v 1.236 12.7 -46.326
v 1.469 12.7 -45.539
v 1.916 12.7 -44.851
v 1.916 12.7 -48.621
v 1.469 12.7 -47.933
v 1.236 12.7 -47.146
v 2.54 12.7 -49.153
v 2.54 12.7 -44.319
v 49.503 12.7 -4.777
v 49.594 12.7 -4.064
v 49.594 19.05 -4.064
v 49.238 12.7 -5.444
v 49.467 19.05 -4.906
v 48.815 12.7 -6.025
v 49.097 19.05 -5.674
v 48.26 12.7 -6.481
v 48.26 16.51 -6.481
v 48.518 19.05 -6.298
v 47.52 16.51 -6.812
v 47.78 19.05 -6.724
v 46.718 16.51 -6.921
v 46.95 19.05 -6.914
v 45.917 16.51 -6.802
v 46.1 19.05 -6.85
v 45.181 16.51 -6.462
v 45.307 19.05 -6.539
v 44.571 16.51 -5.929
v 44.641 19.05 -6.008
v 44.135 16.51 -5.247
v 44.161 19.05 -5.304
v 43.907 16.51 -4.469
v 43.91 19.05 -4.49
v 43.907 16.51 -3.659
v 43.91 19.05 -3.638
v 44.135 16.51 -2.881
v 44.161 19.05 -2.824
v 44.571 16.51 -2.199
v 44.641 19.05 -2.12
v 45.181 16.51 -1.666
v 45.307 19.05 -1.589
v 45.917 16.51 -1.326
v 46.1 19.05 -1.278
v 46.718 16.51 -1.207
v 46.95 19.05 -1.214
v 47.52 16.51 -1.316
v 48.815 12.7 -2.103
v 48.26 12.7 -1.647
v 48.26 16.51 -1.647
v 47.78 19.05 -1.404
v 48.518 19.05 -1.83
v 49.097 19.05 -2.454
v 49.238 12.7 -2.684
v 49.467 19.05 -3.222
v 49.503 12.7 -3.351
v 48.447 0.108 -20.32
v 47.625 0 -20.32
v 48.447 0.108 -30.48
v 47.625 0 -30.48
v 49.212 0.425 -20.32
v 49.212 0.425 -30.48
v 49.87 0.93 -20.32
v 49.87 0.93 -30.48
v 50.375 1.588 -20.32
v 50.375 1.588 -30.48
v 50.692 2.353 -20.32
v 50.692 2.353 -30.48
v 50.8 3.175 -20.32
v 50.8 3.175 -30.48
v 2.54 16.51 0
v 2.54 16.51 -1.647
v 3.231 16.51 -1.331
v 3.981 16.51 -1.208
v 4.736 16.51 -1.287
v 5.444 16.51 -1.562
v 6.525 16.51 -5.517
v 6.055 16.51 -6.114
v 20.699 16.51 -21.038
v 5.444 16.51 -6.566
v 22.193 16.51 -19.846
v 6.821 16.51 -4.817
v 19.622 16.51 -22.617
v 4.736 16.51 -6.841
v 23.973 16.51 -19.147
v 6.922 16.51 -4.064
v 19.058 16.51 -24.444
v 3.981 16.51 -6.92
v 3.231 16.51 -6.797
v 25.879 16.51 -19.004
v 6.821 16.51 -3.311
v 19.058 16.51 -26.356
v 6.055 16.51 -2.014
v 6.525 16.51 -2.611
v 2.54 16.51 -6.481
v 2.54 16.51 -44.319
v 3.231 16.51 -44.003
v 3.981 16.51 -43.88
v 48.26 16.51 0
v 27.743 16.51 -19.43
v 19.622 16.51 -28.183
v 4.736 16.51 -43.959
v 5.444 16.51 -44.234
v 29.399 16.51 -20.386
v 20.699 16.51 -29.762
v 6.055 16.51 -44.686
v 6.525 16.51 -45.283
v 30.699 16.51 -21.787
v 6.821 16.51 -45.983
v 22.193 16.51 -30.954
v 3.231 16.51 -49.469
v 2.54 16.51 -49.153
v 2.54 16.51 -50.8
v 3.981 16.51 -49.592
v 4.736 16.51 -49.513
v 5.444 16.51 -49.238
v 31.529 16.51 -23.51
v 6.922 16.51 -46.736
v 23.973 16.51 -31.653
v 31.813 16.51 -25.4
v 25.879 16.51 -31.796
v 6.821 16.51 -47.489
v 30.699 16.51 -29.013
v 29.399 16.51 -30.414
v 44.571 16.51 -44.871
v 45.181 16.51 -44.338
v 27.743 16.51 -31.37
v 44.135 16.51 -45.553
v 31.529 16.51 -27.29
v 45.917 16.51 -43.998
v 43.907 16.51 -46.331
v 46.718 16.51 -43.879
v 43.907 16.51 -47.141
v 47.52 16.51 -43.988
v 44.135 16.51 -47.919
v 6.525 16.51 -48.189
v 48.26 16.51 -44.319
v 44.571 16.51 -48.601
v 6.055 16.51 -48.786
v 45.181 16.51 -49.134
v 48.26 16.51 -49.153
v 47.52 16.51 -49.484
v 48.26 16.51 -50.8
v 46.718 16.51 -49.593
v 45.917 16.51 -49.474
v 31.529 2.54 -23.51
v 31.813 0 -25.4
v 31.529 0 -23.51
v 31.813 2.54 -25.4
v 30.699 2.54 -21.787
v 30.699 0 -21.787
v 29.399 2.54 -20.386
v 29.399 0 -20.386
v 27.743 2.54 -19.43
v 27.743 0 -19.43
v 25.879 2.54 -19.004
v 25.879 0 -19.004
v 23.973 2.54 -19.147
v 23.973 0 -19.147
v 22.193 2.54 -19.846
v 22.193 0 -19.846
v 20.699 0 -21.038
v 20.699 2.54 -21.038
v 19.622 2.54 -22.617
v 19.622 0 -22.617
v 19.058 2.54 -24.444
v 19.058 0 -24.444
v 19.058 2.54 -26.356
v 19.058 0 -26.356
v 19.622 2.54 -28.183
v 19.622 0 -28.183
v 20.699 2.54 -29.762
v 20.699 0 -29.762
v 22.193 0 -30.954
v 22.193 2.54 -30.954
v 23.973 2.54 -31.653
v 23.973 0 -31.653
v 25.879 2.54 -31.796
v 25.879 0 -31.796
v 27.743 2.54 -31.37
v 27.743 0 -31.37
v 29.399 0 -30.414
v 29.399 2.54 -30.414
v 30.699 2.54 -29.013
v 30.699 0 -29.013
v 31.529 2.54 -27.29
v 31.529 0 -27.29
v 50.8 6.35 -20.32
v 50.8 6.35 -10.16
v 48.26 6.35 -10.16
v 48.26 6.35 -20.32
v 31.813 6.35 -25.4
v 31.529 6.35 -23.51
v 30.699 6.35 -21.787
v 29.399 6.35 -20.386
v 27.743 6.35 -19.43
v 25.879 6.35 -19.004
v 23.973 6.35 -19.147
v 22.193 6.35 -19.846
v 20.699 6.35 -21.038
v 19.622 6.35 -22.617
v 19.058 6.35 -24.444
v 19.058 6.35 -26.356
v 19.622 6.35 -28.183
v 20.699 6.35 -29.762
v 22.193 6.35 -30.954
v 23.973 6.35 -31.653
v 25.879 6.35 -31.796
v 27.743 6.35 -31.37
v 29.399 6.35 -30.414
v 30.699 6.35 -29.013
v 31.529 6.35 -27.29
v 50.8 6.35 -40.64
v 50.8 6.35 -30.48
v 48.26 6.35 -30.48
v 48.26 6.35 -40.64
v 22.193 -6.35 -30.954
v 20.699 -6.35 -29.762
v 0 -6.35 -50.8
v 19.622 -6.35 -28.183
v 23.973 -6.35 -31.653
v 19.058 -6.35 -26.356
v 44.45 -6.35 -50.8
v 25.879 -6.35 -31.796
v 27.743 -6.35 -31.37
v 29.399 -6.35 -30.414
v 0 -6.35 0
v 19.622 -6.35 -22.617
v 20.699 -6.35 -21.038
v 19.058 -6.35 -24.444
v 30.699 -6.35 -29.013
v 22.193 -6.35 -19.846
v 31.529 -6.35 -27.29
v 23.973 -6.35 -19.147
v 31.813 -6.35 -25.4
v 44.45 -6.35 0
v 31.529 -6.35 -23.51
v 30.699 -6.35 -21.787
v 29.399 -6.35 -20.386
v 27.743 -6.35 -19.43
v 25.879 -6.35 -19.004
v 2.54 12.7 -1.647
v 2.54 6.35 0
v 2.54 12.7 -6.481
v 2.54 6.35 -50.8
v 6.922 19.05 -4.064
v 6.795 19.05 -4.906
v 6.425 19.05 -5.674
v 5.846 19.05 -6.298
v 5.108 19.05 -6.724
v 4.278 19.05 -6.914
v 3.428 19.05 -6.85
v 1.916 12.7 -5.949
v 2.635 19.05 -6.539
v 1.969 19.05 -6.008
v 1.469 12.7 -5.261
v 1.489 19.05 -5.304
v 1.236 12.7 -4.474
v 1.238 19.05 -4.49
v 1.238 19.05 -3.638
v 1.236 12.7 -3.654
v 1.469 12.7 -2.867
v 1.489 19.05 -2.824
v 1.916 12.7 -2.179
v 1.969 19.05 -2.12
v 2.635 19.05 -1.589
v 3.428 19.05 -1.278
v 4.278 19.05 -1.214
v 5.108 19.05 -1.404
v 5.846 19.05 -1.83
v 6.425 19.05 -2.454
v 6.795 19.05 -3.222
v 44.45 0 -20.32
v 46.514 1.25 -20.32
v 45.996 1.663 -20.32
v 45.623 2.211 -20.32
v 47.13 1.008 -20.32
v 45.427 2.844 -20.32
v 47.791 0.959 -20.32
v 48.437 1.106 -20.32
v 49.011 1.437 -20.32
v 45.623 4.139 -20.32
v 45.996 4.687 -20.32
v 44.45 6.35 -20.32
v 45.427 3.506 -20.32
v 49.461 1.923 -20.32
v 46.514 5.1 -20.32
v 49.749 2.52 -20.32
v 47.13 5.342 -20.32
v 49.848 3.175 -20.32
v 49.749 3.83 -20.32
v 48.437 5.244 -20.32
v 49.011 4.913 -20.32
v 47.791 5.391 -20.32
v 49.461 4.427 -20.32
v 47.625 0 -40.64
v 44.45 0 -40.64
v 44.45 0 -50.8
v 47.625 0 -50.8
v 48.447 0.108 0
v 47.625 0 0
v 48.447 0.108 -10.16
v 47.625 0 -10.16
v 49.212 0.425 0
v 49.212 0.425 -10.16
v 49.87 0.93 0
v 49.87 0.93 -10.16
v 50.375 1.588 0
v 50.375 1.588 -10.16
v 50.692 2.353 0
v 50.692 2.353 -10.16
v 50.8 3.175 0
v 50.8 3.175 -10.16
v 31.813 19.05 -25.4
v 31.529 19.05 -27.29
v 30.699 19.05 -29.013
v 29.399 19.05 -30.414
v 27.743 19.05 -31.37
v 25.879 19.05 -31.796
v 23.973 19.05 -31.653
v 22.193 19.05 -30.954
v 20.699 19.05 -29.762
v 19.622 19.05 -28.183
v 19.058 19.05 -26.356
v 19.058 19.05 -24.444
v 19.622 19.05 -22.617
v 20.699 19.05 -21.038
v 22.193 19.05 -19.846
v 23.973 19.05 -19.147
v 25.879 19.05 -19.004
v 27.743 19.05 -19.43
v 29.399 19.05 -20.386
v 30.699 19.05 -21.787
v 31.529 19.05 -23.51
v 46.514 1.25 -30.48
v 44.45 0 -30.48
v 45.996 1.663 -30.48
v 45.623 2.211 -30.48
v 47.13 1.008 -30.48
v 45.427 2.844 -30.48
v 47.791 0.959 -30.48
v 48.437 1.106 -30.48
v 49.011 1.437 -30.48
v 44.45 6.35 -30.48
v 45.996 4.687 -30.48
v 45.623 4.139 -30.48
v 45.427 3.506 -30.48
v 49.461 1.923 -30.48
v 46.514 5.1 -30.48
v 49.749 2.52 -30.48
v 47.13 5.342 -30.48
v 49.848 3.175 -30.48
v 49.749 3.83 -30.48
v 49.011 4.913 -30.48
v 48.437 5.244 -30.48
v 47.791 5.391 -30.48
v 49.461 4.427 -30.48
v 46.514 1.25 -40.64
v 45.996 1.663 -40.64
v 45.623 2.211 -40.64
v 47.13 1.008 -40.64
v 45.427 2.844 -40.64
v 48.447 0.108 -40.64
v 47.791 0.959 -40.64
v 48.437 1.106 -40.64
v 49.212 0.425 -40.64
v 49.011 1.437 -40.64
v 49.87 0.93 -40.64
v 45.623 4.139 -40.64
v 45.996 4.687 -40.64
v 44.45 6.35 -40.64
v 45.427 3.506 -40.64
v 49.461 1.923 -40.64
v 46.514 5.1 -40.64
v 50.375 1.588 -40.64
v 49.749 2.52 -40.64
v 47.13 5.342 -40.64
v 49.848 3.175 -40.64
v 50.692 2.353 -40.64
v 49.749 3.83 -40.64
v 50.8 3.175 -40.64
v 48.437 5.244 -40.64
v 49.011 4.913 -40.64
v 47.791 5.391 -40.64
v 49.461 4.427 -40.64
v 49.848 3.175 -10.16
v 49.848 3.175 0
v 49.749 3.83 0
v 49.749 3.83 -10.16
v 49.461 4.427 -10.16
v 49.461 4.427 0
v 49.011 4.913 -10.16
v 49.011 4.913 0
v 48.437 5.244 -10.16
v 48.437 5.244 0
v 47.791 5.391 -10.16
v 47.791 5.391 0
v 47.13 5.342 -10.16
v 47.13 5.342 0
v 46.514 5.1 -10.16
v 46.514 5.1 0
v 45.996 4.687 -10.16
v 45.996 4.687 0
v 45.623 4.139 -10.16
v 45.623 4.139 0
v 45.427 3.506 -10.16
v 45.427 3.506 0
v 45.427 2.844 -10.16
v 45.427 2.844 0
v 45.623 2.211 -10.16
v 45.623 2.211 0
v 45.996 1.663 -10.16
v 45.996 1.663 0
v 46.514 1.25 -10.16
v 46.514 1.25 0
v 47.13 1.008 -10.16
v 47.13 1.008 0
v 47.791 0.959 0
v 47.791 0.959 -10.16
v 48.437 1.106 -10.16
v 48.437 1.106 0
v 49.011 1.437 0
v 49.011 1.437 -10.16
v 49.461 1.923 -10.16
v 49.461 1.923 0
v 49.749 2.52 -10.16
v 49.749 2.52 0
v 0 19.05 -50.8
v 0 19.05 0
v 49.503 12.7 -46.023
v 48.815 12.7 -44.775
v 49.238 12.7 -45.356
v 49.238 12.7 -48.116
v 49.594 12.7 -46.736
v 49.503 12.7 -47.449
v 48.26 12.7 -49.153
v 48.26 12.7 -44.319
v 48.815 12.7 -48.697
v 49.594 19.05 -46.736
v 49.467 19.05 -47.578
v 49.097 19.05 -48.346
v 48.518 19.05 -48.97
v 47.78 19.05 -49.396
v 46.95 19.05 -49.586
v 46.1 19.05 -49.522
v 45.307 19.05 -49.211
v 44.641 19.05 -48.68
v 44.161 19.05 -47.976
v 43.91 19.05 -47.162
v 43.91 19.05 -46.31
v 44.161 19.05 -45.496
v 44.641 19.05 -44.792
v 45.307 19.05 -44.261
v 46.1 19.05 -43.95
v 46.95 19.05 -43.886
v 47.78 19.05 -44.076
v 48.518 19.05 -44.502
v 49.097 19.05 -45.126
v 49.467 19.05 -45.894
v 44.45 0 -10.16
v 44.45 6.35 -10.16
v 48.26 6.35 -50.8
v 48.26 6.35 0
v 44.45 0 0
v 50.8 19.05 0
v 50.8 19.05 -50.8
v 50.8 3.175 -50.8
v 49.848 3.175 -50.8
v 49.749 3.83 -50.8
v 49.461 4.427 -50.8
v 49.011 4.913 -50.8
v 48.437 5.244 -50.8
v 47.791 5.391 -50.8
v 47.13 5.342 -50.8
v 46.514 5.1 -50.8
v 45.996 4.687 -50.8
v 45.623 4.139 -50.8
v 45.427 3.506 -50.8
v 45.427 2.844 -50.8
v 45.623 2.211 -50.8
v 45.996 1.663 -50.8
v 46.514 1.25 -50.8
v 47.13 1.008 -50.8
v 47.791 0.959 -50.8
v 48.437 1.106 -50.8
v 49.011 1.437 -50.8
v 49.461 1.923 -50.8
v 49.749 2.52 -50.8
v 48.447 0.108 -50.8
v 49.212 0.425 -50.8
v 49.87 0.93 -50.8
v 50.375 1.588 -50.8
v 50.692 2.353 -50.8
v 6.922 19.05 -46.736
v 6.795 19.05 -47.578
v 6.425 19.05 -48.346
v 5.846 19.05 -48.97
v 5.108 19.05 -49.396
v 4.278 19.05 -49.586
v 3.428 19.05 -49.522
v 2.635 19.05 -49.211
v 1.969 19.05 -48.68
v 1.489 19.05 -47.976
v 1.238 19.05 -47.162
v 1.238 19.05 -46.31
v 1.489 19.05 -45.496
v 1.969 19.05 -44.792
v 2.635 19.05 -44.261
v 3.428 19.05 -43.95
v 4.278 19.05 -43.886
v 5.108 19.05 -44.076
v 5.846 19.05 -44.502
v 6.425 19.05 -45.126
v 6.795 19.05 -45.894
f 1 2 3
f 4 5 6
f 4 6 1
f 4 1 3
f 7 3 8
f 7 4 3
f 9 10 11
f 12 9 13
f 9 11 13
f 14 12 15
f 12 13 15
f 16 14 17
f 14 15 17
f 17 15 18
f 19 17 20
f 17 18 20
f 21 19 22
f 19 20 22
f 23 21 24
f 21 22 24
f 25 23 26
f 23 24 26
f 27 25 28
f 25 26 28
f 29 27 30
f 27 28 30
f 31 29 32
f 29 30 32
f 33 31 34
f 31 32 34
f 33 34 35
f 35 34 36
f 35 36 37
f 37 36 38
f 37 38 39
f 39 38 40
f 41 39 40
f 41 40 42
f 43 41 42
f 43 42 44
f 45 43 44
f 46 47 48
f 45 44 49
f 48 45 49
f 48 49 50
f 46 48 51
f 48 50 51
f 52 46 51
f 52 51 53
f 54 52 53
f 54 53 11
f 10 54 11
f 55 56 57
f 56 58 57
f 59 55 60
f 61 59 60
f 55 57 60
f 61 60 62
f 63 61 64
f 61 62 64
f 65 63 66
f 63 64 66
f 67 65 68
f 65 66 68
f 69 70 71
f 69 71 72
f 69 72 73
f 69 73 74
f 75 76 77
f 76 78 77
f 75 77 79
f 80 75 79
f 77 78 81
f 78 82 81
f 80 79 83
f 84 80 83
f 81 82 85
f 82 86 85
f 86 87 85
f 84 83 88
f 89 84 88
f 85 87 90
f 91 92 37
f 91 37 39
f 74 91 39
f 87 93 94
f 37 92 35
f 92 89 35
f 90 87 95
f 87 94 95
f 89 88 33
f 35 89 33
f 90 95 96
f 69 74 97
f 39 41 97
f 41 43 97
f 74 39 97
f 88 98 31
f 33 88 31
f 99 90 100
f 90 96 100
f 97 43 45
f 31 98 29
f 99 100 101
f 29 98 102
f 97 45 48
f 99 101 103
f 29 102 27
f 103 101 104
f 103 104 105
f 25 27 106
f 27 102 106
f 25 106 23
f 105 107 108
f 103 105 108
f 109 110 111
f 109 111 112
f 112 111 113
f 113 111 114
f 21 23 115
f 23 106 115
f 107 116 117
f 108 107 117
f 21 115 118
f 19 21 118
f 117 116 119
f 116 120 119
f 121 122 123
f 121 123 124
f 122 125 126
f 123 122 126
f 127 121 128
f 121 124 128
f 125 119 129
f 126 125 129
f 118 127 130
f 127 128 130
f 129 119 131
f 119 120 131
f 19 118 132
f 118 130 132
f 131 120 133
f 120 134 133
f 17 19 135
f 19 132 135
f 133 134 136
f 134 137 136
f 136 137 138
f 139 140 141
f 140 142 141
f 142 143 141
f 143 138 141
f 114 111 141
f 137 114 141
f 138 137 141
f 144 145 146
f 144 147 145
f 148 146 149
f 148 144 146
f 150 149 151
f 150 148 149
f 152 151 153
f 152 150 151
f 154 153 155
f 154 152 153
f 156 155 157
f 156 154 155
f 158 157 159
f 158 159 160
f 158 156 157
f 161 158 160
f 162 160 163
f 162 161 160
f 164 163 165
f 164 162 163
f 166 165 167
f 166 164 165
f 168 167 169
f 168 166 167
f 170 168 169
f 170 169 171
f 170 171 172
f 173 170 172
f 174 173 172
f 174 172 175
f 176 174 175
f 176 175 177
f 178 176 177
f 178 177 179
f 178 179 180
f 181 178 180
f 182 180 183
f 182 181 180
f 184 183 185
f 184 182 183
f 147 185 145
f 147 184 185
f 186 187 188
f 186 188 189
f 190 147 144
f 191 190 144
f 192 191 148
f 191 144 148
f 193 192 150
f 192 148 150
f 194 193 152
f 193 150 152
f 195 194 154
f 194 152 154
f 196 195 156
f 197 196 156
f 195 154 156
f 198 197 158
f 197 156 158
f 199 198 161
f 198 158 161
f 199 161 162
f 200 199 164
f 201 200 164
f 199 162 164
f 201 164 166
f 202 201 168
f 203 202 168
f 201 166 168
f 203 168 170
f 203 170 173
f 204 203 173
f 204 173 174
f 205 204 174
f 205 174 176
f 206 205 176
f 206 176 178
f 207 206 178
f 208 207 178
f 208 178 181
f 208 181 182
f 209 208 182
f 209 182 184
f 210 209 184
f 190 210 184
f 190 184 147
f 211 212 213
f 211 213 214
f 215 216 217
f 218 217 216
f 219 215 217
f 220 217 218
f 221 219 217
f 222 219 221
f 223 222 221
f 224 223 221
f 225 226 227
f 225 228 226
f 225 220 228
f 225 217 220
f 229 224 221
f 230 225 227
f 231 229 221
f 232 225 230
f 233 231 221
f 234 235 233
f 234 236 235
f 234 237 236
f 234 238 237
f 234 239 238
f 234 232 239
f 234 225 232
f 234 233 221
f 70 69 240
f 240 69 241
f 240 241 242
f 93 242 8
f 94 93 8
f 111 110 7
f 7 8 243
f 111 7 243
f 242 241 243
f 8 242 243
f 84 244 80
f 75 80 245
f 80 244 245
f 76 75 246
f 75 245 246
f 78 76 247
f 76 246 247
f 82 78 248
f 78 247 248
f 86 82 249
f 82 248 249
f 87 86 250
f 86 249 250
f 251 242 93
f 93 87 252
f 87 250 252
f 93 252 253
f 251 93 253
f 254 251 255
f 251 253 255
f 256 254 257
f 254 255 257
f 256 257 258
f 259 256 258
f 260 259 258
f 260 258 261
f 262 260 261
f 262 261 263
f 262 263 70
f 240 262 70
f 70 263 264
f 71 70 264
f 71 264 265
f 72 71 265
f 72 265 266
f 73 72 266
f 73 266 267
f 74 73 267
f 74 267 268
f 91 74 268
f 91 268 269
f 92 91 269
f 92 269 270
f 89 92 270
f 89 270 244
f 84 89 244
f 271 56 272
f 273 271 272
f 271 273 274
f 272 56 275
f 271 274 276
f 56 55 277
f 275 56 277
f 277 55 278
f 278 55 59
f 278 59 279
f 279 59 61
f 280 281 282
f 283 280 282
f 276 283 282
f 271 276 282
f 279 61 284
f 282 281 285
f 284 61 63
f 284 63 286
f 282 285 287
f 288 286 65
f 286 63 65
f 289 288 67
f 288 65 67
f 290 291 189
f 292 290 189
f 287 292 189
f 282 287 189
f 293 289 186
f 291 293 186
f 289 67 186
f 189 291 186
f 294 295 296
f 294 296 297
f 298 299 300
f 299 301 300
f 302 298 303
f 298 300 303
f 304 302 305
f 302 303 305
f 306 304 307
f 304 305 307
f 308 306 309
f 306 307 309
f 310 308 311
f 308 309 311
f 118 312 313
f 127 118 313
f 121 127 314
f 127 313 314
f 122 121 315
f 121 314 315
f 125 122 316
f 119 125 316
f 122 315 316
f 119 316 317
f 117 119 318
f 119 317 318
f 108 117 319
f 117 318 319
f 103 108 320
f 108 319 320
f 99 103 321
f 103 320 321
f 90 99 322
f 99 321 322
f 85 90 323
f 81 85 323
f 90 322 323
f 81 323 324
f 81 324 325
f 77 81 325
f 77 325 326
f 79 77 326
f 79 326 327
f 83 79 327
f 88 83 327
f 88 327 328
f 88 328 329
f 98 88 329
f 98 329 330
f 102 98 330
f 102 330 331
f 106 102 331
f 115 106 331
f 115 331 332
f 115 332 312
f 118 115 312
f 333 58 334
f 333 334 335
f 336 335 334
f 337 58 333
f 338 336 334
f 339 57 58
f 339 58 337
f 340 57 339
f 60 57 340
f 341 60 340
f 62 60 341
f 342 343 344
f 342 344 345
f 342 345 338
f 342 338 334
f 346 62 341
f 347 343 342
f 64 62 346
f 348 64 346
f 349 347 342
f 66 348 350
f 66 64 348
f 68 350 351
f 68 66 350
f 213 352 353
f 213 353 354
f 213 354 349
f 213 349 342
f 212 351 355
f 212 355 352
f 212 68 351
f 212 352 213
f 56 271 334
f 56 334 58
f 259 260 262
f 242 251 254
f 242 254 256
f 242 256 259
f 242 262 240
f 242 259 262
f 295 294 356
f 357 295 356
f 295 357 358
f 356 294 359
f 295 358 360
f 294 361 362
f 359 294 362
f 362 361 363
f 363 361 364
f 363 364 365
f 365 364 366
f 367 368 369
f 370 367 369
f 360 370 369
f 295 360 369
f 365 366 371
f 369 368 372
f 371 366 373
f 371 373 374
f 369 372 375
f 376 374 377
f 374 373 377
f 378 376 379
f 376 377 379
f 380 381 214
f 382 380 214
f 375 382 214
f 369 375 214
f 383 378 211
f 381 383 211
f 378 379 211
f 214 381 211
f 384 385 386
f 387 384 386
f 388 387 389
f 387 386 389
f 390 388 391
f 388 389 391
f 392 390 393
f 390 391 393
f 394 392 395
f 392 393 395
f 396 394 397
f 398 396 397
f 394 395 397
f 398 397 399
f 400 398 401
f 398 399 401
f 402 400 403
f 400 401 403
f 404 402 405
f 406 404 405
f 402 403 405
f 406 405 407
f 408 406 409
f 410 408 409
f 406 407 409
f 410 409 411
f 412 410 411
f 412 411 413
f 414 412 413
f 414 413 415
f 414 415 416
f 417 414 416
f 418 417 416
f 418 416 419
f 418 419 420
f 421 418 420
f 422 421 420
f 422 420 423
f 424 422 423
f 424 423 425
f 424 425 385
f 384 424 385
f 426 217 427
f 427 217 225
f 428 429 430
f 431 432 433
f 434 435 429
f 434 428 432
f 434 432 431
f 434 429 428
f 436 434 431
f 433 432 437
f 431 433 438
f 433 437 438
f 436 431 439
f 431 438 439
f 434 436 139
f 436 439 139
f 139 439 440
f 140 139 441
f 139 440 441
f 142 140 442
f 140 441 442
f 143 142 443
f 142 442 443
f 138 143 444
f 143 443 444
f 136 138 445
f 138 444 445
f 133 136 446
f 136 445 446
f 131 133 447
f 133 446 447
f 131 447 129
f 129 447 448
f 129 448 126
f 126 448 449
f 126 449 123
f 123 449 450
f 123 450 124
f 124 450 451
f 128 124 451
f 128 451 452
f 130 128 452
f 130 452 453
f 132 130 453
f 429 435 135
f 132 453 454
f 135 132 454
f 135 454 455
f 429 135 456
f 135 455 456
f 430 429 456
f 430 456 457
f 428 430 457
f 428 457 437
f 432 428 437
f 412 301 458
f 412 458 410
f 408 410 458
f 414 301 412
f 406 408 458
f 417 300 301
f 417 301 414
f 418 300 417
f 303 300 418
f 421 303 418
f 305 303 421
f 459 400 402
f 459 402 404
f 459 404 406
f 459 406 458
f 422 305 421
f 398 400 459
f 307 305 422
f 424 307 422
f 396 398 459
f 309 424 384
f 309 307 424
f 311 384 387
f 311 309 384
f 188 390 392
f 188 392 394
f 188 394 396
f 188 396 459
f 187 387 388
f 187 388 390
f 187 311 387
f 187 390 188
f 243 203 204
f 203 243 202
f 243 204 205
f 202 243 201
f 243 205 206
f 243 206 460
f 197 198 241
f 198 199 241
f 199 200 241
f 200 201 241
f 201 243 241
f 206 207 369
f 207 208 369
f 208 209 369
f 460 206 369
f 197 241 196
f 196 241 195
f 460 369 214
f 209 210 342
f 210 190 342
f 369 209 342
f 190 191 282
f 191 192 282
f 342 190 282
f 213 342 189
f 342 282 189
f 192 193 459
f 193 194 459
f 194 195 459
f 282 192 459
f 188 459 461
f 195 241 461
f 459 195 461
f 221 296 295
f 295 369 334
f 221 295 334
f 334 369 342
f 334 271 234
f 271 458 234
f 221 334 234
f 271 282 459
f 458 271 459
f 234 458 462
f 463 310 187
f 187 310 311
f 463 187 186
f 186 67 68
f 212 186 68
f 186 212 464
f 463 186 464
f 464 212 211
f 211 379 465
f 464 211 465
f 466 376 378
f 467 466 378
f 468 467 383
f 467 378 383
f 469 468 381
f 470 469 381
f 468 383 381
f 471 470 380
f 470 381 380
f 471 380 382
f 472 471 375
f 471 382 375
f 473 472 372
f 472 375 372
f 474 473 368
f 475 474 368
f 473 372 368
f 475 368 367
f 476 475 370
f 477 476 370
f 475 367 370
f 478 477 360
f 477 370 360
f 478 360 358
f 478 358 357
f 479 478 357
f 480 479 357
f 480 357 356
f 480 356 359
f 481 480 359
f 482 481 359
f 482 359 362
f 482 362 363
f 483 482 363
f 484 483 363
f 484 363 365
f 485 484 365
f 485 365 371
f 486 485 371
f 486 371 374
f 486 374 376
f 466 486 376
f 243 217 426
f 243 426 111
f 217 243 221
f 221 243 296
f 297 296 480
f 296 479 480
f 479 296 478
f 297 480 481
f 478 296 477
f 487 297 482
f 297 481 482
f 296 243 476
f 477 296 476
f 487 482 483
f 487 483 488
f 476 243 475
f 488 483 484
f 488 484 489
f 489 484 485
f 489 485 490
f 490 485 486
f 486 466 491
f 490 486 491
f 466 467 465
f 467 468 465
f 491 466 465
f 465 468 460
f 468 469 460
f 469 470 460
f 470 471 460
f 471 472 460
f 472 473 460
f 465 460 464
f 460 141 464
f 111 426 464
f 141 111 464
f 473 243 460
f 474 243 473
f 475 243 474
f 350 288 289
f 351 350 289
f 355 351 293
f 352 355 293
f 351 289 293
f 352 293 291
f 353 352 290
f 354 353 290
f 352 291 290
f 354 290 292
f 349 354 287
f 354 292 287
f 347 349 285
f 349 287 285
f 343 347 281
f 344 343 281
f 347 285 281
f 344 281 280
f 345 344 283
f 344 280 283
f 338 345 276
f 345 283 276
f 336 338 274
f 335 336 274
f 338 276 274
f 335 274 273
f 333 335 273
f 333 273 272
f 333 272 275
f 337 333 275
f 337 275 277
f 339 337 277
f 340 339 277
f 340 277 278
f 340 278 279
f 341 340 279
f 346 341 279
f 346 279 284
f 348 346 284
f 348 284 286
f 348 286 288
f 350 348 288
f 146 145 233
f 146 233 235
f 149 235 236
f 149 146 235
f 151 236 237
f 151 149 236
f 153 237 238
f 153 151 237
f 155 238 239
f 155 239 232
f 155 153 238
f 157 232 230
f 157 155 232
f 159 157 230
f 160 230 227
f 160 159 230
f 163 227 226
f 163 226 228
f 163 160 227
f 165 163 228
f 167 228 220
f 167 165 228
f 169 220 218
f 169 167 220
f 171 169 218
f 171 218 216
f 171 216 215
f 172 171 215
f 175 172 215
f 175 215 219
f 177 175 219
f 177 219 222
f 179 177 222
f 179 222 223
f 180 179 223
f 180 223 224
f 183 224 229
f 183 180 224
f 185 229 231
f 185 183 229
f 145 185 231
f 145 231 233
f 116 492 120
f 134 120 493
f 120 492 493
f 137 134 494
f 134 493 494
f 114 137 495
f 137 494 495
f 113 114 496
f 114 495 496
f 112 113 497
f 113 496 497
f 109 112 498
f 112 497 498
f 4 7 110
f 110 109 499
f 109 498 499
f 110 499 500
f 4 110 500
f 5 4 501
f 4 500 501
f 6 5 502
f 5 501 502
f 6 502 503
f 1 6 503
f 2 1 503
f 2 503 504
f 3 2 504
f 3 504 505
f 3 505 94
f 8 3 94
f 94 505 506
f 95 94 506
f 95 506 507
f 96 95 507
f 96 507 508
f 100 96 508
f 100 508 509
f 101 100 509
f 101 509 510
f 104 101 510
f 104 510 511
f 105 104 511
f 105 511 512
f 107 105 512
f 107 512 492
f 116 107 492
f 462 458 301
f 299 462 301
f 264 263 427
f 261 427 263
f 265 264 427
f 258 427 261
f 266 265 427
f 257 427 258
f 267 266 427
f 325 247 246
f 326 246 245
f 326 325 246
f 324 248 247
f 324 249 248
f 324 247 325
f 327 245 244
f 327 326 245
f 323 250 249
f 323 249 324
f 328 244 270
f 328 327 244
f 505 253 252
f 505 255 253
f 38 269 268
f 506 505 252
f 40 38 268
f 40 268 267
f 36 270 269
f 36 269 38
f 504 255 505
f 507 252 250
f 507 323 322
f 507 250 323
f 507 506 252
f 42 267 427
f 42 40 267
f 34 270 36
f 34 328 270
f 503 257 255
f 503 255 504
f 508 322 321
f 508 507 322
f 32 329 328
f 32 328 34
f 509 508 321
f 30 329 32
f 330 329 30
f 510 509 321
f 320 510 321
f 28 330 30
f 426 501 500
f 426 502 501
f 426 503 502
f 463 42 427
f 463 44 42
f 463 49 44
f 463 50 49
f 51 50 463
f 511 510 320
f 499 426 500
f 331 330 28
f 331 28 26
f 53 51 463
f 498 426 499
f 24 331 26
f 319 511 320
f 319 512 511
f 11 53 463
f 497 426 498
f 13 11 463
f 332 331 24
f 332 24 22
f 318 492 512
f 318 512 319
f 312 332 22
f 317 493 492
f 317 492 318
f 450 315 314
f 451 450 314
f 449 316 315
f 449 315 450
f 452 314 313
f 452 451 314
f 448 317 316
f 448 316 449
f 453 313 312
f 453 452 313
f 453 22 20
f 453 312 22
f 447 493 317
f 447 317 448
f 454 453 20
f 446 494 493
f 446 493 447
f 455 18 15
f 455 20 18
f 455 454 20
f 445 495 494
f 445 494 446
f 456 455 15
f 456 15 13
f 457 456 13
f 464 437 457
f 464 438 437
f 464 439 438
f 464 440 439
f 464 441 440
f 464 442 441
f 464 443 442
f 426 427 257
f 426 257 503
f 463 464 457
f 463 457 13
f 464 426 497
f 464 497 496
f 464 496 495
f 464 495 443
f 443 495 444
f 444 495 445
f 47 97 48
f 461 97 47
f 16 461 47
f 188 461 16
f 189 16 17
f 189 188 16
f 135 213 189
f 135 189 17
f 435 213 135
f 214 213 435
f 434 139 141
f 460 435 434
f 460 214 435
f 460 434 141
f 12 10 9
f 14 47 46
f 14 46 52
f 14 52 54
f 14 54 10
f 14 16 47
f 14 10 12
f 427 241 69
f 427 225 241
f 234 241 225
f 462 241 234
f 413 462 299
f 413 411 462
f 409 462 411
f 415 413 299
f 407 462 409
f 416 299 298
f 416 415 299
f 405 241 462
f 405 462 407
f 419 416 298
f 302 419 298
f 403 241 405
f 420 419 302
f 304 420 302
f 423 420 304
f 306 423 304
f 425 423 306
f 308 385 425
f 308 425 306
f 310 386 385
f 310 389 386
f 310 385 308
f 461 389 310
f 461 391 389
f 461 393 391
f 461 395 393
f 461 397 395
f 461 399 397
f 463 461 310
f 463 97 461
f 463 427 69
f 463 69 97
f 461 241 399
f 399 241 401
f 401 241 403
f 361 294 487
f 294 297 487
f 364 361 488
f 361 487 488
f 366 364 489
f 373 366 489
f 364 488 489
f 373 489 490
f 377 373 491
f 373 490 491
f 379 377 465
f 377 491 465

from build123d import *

# Parameters (mm, degrees)
SKETCH2_W                = 50.8
SKETCH2_H                = 50.8
BOSS_EXTRUDE1_DEPTH      = 19.05
SHELL1_T                 = -2.54
SKETCH4_R                = 6.4135
SKETCH4_R_2              = 2.8575
CUT_EXTRUDE1_DEPTH       = 6.35
SKETCH5_W                = 6.35
SKETCH5_H                = 6.35
BOSS_EXTRUDE3_DEPTH      = 50.8
SKETCH6_R                = 2.2225
CUT_EXTRUDE2_DEPTH       = 51.8
SKETCH7_W                = 10.16
SKETCH7_H                = 6.35
CUT_EXTRUDE3_DEPTH       = 6.35
FILLET1_R                = 3.175
SKETCH8_R                = 6.4135
CUT_EXTRUDE4_DEPTH       = 6.35
SKETCH9_W                = 44.45
SKETCH9_H                = 50.8
SKETCH9_R                = 6.4135
BOSS_EXTRUDE4_DEPTH      = 6.35
BOSS_EXTRUDE4_DEPTH_BACK = 6.35


with BuildPart() as part:
    # Sketch2 → Boss-Extrude1 (new body)
    with BuildSketch(Plane(origin=(0, 0, 0), x_dir=(1, 0, 0), z_dir=(0, 1, 0))):
        with Locations((25.4, 25.4)):
            Rectangle(SKETCH2_W, SKETCH2_H)
    extrude(amount=BOSS_EXTRUDE1_DEPTH)

    # Shell1
    shell1_openings = [part.faces().sort_by_distance(p)[0] for p in [
        (25.4, 9.525, -50.8),
        (25.4, 9.525, 0),
    ]]
    offset(amount=SHELL1_T, openings=shell1_openings, kind=Kind.INTERSECTION)

    # Sketch4 → Cut-Extrude1 (cut)
    with BuildSketch(Plane(origin=(0, 19.05, 0), x_dir=(1, 0, 0), z_dir=(0, 1, 0))):
        with Locations((25.4, 25.4)):
            Circle(SKETCH4_R)
        with Locations((4.064, 46.736)):
            Circle(SKETCH4_R_2)
        with Locations((46.736, 46.736)):
            Circle(SKETCH4_R_2)
        with Locations((46.736, 4.064)):
            Circle(SKETCH4_R_2)
        with Locations((4.064, 4.064)):
            Circle(SKETCH4_R_2)
    extrude(amount=-CUT_EXTRUDE1_DEPTH, mode=Mode.SUBTRACT)

    # Sketch5 → Boss-Extrude3 (add)
    with BuildSketch(Plane.XY):
        with Locations((47.625, 3.175)):
            Rectangle(SKETCH5_W, SKETCH5_H)
    extrude(amount=-BOSS_EXTRUDE3_DEPTH)

    # Sketch6 → Cut-Extrude2 (cut, through all)
    with BuildSketch(Plane.XY):
        with Locations((47.625, 3.175)):
            Circle(SKETCH6_R)
    extrude(amount=-CUT_EXTRUDE2_DEPTH, mode=Mode.SUBTRACT)

    # Sketch7 → Cut-Extrude3 (cut)
    with BuildSketch(Plane(origin=(50.8, 0, 0), x_dir=(0, 0, -1), z_dir=(1, 0, 0))):
        with Locations((15.24, 3.175)):
            Rectangle(SKETCH7_W, SKETCH7_H)
        with Locations((35.56, 3.175)):
            Rectangle(SKETCH7_W, SKETCH7_H)
    extrude(amount=-CUT_EXTRUDE3_DEPTH, mode=Mode.SUBTRACT)

    # Fillet1
    fillet1_edges = [part.edges().sort_by_distance(p)[0] for p in [
        (50.8, 0, -25.4),
        (50.8, 0, -45.72),
        (50.8, 0, -5.08),
    ]]
    fillet(fillet1_edges, radius=FILLET1_R)

    # Sketch8 → Cut-Extrude4 (cut)
    with BuildSketch(Plane(origin=(0, 2.54, 0), x_dir=(1, 0, 0), z_dir=(0, 1, 0))):
        with Locations((25.4, 25.4)):
            Circle(SKETCH8_R)
    extrude(amount=-CUT_EXTRUDE4_DEPTH, mode=Mode.SUBTRACT)

    # Sketch9 → Boss-Extrude4 (add, two sides)
    with BuildSketch(Plane.XZ) as boss_extrude4_sk:
        with Locations((22.225, -25.4)):
            Rectangle(SKETCH9_W, SKETCH9_H)
        with Locations((25.4, -25.4)):
            Circle(SKETCH9_R, mode=Mode.SUBTRACT)
    extrude(amount=BOSS_EXTRUDE4_DEPTH)
    extrude(boss_extrude4_sk.sketch, amount=-BOSS_EXTRUDE4_DEPTH_BACK)


solid = part.part
